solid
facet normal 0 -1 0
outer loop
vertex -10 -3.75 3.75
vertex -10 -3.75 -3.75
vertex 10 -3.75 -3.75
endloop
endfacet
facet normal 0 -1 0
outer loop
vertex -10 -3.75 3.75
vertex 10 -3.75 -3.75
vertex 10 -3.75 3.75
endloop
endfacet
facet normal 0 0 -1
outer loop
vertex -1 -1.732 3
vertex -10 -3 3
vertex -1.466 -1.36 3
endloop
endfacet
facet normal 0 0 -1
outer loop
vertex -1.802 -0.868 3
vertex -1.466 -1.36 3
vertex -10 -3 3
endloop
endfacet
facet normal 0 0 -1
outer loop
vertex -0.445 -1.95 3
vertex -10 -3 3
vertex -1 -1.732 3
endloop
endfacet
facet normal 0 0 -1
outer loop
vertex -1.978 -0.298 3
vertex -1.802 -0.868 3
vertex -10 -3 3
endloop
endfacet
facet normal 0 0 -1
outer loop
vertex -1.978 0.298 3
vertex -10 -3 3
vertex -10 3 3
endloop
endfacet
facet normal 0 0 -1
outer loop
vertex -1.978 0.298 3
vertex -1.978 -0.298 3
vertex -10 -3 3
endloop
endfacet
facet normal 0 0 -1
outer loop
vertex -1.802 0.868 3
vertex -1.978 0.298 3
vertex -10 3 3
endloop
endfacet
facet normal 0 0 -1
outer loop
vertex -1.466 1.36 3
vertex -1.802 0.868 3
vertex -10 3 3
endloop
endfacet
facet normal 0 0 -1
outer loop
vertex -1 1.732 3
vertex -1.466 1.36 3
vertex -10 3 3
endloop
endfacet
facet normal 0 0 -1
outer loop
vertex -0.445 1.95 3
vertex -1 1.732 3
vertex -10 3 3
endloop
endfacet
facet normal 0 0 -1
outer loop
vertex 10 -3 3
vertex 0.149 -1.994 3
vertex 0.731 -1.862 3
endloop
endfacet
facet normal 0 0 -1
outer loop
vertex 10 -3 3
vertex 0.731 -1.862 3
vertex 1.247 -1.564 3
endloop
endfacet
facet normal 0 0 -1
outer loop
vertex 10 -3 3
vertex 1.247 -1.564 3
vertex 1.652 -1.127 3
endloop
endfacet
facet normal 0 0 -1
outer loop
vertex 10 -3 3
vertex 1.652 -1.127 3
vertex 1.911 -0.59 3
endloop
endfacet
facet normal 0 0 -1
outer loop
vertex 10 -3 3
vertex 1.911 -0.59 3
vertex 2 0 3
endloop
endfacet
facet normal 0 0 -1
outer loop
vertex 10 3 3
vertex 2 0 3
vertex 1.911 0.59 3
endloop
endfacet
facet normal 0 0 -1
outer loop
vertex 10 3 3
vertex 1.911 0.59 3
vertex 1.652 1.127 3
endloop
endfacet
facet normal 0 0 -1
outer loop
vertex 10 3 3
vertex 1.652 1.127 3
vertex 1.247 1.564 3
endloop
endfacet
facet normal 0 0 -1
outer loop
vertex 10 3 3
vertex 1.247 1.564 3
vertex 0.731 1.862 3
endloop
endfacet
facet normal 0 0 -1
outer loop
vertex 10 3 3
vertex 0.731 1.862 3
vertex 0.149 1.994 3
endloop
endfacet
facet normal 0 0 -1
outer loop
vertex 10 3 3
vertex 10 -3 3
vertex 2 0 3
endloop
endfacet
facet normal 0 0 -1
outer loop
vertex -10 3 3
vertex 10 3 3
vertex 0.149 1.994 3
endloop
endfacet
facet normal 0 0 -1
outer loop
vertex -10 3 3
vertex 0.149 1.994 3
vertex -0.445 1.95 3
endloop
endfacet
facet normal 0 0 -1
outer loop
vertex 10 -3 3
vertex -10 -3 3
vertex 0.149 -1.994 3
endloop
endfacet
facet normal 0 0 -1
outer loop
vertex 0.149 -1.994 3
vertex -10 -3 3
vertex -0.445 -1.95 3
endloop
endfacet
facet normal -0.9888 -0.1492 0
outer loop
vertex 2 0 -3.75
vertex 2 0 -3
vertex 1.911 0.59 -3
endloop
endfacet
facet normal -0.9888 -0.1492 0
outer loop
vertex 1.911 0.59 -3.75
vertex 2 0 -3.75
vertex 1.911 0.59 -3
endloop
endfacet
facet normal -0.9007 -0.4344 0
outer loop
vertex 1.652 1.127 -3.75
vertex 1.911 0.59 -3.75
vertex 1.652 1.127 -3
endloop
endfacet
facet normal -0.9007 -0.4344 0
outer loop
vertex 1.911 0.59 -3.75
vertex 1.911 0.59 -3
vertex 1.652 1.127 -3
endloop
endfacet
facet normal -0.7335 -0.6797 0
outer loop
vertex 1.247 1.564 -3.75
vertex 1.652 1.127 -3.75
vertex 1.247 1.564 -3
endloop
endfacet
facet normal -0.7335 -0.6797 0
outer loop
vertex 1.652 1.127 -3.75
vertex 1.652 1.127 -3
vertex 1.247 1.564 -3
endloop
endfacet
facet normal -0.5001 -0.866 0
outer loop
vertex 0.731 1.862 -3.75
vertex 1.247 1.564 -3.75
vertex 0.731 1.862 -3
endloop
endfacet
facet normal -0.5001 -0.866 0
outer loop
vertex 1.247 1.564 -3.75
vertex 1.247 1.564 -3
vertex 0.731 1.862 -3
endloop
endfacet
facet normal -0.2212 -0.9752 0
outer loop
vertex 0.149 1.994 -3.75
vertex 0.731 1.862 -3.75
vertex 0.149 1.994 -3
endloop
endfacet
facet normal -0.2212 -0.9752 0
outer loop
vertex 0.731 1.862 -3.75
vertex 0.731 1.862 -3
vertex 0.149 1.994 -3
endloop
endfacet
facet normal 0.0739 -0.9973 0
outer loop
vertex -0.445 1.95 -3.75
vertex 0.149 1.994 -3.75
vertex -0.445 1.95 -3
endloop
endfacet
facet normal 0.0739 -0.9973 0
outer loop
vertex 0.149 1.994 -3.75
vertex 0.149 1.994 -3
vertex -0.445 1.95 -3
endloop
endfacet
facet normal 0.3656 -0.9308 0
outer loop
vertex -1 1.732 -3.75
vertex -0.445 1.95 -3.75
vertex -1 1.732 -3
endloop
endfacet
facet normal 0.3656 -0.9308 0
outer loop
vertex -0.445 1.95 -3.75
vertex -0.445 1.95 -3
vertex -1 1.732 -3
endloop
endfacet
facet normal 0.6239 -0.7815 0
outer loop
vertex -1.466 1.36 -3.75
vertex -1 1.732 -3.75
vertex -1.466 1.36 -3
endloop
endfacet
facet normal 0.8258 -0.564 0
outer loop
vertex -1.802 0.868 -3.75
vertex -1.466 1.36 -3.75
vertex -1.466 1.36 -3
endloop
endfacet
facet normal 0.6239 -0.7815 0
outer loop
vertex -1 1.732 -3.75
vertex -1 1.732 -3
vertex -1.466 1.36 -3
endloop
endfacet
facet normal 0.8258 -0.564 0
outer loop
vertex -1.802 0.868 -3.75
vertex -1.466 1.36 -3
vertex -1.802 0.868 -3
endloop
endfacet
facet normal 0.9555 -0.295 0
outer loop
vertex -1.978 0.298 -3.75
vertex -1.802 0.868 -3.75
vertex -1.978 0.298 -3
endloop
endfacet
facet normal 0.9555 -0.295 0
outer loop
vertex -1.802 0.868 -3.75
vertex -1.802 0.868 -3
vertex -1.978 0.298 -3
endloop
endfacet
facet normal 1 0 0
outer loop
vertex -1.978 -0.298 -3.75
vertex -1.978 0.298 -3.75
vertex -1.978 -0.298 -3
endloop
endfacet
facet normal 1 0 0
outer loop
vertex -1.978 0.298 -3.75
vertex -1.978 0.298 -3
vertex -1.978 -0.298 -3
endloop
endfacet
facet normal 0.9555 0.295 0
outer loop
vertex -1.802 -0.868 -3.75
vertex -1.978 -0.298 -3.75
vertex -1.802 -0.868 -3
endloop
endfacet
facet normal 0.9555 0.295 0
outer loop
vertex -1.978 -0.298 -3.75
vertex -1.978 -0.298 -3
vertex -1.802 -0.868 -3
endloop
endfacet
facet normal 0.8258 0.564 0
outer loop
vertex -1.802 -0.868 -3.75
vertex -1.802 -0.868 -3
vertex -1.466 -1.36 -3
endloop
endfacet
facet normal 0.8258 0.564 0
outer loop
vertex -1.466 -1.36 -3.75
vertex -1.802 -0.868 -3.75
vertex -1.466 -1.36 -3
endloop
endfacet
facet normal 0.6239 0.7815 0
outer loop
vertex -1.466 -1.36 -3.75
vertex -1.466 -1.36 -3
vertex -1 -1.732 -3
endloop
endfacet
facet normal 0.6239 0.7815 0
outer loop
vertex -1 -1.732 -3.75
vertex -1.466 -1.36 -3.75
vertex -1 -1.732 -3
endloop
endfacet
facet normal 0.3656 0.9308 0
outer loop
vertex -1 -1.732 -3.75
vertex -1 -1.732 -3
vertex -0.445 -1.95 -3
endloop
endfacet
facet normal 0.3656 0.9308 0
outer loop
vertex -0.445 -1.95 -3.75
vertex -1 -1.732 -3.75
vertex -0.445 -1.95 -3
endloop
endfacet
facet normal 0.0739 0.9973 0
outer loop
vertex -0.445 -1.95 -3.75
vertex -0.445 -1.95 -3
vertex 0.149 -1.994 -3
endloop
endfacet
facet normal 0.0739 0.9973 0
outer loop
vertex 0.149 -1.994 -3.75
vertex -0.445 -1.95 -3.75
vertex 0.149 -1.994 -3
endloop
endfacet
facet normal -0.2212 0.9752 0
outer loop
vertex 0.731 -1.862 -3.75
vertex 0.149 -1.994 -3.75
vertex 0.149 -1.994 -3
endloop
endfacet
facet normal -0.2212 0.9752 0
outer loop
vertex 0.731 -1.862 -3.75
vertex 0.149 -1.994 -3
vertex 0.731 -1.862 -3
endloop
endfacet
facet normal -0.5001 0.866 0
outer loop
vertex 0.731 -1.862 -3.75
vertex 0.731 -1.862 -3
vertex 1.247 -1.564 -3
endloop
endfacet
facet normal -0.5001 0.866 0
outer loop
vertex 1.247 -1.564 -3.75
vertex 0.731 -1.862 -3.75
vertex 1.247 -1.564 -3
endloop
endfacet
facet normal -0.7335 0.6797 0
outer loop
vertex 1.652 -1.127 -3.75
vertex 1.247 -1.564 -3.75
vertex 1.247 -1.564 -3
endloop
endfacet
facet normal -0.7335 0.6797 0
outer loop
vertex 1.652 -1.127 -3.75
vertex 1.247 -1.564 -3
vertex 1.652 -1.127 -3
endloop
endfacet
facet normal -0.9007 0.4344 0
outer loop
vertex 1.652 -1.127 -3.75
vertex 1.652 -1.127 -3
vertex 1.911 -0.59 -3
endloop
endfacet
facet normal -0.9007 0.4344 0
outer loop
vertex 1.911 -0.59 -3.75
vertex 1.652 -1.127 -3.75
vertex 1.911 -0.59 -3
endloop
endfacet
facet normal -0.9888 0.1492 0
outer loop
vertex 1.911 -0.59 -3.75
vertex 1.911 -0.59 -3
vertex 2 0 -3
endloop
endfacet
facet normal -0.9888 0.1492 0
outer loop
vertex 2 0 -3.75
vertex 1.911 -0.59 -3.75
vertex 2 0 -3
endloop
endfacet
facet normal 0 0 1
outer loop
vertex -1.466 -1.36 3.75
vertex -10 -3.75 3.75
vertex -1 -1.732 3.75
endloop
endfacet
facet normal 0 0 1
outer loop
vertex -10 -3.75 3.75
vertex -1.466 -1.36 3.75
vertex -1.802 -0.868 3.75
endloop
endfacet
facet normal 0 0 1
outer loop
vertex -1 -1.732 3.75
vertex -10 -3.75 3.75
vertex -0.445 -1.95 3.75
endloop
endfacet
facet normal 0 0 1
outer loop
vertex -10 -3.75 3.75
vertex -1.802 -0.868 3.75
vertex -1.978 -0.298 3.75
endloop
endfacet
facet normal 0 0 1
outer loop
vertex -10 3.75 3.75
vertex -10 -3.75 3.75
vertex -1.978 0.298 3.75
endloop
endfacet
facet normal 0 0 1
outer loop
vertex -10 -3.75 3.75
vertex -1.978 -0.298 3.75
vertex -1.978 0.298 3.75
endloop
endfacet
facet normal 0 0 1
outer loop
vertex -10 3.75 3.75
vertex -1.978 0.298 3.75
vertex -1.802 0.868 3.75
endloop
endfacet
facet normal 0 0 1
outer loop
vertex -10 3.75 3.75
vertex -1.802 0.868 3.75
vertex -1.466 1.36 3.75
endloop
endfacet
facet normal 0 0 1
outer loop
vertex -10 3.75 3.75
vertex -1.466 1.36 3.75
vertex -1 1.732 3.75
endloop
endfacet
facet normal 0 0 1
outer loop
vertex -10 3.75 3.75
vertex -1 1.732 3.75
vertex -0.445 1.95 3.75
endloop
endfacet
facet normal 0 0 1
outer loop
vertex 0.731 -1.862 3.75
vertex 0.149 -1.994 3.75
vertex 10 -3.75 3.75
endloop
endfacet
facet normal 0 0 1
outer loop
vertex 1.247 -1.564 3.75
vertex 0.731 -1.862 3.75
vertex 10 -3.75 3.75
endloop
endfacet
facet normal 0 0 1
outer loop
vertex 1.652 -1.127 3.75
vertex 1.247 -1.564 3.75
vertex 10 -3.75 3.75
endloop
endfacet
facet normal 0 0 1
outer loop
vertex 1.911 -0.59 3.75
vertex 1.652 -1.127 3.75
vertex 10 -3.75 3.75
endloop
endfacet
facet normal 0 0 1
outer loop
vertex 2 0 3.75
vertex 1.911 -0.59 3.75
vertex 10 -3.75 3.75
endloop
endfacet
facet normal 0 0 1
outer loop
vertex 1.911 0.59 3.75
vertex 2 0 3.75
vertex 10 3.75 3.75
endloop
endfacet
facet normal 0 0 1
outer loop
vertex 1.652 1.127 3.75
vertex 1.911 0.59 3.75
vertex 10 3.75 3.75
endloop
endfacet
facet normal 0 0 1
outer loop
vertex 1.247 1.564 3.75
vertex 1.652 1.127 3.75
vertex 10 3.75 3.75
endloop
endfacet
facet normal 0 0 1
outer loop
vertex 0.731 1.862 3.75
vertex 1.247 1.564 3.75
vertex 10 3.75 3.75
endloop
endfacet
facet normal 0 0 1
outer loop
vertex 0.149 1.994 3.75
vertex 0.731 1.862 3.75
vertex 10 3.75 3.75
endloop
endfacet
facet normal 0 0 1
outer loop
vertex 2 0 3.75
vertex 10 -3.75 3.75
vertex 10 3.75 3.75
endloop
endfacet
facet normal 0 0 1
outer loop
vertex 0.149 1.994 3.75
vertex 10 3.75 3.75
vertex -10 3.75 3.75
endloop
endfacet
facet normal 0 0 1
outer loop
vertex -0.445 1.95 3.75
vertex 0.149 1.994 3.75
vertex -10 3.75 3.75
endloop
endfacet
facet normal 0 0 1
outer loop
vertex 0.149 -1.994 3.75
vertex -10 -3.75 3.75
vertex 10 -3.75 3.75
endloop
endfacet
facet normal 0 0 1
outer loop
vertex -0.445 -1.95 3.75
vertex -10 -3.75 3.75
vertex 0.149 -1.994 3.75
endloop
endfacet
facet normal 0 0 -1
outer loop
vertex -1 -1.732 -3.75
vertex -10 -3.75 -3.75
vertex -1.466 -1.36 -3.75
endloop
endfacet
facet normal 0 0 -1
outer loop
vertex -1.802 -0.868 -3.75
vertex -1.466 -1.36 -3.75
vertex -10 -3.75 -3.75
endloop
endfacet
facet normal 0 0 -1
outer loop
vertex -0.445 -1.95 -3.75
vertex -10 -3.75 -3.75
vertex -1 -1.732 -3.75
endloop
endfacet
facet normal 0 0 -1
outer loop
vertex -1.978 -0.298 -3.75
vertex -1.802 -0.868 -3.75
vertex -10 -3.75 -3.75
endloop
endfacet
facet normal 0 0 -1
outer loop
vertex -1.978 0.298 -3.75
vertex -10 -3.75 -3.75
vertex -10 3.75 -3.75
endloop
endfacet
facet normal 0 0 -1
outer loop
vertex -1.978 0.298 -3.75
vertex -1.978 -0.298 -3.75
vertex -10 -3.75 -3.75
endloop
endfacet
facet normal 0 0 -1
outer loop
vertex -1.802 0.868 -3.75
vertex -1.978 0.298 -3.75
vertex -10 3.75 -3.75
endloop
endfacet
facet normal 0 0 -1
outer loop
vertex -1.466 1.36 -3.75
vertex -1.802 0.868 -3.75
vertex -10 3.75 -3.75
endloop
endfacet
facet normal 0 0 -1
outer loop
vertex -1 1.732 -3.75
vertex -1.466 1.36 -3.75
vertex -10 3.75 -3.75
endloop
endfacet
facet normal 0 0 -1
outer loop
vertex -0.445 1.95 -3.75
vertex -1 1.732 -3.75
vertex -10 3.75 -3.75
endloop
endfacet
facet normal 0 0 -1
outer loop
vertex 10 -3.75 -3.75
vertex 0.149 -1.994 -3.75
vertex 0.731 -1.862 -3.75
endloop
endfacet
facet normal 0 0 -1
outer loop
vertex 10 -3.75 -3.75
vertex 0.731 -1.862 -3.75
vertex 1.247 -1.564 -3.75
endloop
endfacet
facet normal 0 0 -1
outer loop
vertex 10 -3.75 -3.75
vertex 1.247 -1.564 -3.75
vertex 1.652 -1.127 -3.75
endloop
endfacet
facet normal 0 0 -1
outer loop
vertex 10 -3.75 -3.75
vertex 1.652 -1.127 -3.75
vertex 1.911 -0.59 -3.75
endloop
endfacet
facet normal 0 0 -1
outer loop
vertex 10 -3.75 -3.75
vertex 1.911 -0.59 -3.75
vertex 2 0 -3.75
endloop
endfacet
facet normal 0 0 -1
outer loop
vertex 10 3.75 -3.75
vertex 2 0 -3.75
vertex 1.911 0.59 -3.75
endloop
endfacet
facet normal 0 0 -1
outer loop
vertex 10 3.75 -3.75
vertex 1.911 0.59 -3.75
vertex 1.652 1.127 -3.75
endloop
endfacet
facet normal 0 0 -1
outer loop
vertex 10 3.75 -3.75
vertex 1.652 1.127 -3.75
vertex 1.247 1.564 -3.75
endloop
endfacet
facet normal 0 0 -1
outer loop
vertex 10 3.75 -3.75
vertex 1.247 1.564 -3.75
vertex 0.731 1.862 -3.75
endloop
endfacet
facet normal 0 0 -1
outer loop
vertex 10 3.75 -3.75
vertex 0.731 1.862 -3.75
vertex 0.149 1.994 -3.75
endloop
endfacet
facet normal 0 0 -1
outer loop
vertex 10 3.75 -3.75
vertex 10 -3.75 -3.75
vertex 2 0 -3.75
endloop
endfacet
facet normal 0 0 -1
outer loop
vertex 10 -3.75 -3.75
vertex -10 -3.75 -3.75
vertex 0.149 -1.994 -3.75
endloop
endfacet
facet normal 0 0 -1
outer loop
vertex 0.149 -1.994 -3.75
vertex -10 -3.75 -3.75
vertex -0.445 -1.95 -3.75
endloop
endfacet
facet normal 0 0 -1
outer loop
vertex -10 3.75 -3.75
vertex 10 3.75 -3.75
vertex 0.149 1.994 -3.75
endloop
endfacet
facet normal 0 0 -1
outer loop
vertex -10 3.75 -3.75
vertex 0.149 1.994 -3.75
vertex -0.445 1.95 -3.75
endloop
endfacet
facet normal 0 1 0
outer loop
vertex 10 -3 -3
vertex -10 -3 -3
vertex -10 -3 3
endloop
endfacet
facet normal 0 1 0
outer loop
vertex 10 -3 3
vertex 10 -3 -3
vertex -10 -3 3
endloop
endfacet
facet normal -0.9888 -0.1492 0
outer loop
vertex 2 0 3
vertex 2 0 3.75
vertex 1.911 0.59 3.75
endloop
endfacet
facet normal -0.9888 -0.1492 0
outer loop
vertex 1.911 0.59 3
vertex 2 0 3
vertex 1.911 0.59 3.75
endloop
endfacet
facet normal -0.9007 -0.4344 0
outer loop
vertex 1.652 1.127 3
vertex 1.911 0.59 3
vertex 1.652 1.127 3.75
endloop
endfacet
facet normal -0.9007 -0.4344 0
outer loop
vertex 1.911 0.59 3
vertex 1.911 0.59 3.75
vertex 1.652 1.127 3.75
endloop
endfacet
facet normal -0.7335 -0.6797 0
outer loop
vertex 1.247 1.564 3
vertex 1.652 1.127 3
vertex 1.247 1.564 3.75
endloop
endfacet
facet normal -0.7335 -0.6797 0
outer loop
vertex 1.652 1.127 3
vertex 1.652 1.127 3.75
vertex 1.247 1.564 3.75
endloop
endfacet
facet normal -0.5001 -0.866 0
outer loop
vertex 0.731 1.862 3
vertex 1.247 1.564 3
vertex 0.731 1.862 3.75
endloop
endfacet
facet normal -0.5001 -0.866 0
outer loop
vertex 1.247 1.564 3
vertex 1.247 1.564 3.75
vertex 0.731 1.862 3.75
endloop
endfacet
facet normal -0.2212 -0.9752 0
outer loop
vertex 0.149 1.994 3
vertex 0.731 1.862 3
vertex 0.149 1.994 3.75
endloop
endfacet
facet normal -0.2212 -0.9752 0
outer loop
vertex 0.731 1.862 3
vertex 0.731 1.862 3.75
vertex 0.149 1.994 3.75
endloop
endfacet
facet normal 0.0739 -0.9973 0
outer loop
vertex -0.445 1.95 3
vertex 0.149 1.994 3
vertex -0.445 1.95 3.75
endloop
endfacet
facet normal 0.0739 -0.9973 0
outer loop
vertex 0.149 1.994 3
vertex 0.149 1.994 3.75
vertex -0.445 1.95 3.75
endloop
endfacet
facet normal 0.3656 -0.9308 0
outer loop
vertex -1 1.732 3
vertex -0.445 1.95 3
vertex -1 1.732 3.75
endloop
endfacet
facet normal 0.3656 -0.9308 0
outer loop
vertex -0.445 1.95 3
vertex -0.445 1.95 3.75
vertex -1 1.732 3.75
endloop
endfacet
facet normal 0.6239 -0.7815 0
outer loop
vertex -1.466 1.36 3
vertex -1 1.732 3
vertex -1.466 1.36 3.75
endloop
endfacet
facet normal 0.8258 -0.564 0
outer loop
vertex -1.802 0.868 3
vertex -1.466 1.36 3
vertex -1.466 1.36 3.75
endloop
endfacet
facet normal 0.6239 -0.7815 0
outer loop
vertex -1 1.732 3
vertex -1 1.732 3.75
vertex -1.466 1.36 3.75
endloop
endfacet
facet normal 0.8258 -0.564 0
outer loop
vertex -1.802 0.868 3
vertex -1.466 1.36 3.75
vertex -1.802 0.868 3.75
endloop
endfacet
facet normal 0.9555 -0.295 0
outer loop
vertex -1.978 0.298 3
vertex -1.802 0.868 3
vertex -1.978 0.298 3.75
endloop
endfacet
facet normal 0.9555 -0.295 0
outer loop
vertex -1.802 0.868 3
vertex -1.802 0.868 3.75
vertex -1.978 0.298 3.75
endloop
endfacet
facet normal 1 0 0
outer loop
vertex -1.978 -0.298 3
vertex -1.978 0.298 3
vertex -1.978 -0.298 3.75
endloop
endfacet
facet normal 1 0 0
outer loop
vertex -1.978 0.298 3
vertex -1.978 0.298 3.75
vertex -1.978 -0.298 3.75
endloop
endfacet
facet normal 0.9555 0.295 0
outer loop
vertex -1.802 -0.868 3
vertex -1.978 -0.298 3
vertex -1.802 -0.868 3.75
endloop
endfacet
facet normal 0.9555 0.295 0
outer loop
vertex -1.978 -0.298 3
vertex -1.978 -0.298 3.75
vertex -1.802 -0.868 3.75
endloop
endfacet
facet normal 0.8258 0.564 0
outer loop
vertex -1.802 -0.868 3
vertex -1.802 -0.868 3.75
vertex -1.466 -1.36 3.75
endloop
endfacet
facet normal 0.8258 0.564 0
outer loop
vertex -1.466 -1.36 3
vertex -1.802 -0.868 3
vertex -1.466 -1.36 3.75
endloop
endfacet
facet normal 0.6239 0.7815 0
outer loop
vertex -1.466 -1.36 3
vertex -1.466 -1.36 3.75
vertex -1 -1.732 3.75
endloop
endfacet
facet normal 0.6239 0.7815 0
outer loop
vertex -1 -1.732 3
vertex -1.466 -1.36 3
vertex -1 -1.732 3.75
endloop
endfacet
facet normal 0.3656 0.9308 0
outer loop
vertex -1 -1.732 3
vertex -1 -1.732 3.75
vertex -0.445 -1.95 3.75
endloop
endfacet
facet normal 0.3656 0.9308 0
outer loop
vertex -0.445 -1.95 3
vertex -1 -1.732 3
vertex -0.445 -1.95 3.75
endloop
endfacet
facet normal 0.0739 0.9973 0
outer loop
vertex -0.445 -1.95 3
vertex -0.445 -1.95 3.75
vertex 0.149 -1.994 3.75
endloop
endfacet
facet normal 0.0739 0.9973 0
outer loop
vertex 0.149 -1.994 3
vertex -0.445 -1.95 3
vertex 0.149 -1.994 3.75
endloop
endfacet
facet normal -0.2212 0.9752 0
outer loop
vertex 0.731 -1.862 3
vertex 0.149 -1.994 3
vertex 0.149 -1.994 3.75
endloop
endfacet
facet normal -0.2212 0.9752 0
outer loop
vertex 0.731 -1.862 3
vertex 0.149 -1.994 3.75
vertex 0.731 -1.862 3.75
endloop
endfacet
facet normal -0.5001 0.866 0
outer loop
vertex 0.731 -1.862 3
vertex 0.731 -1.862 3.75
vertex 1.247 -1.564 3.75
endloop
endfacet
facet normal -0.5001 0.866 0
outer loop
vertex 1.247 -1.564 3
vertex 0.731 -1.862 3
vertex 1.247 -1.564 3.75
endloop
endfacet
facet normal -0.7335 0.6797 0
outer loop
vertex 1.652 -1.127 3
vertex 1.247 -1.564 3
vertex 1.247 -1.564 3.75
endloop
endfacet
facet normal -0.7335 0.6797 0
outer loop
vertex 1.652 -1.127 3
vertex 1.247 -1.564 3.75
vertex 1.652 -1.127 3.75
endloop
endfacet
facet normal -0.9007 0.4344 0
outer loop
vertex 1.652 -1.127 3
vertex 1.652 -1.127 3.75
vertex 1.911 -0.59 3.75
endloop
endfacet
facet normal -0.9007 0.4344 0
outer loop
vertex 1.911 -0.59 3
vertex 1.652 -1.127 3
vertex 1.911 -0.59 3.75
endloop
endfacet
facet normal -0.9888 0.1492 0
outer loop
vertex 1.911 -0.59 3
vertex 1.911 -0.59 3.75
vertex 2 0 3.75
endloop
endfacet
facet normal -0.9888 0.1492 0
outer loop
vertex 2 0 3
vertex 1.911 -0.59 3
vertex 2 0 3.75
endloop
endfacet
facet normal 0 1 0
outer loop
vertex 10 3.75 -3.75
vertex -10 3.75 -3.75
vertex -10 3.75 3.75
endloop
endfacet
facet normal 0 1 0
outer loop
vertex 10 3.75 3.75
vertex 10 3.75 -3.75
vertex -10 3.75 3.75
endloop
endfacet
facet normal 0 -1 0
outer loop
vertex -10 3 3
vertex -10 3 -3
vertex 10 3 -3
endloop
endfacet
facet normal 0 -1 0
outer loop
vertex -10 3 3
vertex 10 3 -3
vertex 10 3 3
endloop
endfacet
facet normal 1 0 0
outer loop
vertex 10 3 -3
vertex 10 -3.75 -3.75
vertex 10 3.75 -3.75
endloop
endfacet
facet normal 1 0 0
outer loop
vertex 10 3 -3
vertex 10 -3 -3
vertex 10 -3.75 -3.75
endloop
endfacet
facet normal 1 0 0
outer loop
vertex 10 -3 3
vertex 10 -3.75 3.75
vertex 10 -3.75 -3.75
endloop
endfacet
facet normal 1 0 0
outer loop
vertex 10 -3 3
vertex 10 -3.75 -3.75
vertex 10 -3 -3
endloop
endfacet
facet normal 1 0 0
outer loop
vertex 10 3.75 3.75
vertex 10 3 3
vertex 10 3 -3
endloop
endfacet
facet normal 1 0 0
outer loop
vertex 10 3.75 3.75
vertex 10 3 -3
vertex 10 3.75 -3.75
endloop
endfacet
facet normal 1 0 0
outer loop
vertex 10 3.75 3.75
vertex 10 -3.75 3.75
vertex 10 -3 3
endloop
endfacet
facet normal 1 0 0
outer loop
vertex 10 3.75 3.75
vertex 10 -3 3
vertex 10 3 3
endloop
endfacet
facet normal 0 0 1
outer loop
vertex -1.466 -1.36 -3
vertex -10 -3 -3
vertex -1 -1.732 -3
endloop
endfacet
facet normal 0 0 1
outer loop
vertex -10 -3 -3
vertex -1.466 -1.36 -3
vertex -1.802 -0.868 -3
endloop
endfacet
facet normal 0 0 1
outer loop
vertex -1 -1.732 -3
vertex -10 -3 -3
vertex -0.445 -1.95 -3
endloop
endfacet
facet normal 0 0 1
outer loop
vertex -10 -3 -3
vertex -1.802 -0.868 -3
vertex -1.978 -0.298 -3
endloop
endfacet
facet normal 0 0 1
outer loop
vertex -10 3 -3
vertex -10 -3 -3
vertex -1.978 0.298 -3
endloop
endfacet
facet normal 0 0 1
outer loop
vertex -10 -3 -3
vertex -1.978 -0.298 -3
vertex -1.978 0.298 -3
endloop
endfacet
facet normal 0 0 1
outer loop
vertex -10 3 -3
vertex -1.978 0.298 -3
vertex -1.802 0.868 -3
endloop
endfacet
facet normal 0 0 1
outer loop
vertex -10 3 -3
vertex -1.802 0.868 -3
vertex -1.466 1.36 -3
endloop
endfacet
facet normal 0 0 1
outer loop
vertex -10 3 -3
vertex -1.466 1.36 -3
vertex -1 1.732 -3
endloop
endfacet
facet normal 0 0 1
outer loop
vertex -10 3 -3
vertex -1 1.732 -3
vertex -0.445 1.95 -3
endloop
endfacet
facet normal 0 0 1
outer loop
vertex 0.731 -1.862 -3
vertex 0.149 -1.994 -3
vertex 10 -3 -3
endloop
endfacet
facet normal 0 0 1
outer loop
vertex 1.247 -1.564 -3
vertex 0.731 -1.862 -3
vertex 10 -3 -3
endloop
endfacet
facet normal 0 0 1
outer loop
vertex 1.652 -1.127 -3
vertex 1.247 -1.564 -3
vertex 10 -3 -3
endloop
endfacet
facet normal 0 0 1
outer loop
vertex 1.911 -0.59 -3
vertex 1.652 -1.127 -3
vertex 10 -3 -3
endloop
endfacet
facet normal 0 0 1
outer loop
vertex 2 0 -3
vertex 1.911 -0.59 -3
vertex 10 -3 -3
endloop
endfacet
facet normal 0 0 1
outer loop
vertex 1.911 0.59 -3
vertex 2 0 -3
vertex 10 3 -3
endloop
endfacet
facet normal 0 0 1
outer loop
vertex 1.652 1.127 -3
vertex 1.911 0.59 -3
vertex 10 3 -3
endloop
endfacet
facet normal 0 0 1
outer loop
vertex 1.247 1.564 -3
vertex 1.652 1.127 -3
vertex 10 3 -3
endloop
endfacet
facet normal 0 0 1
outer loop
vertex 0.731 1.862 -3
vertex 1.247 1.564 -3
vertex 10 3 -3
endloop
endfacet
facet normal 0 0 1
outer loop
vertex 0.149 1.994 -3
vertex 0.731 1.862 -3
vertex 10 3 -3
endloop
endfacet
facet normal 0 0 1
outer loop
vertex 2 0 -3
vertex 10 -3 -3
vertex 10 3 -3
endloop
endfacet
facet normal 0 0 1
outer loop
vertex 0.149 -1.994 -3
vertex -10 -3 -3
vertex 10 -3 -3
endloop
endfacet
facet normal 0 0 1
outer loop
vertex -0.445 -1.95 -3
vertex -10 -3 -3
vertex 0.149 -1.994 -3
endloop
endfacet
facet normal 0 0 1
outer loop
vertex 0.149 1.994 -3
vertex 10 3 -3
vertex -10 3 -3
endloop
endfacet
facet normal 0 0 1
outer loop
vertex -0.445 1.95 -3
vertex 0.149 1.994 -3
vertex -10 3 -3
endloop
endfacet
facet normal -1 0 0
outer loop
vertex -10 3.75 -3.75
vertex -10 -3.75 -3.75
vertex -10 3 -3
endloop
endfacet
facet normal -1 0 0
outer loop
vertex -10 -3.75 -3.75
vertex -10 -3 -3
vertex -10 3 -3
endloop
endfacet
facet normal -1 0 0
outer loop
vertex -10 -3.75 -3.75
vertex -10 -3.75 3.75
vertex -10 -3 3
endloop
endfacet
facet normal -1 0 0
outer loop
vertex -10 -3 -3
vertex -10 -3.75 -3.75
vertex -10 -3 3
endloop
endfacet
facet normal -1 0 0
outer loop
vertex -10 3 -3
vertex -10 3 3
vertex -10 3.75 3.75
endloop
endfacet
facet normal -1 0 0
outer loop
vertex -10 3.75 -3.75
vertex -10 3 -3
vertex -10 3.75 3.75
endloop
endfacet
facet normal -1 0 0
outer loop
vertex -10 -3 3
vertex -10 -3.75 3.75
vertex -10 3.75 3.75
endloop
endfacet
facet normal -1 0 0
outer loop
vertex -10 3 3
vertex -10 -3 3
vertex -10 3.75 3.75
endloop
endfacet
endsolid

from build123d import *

# Parameters (mm, degrees)
F0_W     = 7.5
F0_H     = 7.5
F0_W_2   = 6
F0_H_2   = 6
F1_DEPTH = 10
F2_R     = 2
F3_DEPTH = 25


with BuildPart() as f1:
    # F0 (on Right) → F1 (new body, symmetric)
    with BuildSketch(Plane.YZ):
        Rectangle(F0_W, F0_H)
        Rectangle(F0_W_2, F0_H_2, mode=Mode.SUBTRACT)
    extrude(amount=F1_DEPTH, both=True)

    # F2 (on face) → F3 (cut)
    with BuildSketch(Plane.XY.offset(3.75)):
        Circle(F2_R)
    extrude(amount=-F3_DEPTH, mode=Mode.SUBTRACT)


solid = f1.part
